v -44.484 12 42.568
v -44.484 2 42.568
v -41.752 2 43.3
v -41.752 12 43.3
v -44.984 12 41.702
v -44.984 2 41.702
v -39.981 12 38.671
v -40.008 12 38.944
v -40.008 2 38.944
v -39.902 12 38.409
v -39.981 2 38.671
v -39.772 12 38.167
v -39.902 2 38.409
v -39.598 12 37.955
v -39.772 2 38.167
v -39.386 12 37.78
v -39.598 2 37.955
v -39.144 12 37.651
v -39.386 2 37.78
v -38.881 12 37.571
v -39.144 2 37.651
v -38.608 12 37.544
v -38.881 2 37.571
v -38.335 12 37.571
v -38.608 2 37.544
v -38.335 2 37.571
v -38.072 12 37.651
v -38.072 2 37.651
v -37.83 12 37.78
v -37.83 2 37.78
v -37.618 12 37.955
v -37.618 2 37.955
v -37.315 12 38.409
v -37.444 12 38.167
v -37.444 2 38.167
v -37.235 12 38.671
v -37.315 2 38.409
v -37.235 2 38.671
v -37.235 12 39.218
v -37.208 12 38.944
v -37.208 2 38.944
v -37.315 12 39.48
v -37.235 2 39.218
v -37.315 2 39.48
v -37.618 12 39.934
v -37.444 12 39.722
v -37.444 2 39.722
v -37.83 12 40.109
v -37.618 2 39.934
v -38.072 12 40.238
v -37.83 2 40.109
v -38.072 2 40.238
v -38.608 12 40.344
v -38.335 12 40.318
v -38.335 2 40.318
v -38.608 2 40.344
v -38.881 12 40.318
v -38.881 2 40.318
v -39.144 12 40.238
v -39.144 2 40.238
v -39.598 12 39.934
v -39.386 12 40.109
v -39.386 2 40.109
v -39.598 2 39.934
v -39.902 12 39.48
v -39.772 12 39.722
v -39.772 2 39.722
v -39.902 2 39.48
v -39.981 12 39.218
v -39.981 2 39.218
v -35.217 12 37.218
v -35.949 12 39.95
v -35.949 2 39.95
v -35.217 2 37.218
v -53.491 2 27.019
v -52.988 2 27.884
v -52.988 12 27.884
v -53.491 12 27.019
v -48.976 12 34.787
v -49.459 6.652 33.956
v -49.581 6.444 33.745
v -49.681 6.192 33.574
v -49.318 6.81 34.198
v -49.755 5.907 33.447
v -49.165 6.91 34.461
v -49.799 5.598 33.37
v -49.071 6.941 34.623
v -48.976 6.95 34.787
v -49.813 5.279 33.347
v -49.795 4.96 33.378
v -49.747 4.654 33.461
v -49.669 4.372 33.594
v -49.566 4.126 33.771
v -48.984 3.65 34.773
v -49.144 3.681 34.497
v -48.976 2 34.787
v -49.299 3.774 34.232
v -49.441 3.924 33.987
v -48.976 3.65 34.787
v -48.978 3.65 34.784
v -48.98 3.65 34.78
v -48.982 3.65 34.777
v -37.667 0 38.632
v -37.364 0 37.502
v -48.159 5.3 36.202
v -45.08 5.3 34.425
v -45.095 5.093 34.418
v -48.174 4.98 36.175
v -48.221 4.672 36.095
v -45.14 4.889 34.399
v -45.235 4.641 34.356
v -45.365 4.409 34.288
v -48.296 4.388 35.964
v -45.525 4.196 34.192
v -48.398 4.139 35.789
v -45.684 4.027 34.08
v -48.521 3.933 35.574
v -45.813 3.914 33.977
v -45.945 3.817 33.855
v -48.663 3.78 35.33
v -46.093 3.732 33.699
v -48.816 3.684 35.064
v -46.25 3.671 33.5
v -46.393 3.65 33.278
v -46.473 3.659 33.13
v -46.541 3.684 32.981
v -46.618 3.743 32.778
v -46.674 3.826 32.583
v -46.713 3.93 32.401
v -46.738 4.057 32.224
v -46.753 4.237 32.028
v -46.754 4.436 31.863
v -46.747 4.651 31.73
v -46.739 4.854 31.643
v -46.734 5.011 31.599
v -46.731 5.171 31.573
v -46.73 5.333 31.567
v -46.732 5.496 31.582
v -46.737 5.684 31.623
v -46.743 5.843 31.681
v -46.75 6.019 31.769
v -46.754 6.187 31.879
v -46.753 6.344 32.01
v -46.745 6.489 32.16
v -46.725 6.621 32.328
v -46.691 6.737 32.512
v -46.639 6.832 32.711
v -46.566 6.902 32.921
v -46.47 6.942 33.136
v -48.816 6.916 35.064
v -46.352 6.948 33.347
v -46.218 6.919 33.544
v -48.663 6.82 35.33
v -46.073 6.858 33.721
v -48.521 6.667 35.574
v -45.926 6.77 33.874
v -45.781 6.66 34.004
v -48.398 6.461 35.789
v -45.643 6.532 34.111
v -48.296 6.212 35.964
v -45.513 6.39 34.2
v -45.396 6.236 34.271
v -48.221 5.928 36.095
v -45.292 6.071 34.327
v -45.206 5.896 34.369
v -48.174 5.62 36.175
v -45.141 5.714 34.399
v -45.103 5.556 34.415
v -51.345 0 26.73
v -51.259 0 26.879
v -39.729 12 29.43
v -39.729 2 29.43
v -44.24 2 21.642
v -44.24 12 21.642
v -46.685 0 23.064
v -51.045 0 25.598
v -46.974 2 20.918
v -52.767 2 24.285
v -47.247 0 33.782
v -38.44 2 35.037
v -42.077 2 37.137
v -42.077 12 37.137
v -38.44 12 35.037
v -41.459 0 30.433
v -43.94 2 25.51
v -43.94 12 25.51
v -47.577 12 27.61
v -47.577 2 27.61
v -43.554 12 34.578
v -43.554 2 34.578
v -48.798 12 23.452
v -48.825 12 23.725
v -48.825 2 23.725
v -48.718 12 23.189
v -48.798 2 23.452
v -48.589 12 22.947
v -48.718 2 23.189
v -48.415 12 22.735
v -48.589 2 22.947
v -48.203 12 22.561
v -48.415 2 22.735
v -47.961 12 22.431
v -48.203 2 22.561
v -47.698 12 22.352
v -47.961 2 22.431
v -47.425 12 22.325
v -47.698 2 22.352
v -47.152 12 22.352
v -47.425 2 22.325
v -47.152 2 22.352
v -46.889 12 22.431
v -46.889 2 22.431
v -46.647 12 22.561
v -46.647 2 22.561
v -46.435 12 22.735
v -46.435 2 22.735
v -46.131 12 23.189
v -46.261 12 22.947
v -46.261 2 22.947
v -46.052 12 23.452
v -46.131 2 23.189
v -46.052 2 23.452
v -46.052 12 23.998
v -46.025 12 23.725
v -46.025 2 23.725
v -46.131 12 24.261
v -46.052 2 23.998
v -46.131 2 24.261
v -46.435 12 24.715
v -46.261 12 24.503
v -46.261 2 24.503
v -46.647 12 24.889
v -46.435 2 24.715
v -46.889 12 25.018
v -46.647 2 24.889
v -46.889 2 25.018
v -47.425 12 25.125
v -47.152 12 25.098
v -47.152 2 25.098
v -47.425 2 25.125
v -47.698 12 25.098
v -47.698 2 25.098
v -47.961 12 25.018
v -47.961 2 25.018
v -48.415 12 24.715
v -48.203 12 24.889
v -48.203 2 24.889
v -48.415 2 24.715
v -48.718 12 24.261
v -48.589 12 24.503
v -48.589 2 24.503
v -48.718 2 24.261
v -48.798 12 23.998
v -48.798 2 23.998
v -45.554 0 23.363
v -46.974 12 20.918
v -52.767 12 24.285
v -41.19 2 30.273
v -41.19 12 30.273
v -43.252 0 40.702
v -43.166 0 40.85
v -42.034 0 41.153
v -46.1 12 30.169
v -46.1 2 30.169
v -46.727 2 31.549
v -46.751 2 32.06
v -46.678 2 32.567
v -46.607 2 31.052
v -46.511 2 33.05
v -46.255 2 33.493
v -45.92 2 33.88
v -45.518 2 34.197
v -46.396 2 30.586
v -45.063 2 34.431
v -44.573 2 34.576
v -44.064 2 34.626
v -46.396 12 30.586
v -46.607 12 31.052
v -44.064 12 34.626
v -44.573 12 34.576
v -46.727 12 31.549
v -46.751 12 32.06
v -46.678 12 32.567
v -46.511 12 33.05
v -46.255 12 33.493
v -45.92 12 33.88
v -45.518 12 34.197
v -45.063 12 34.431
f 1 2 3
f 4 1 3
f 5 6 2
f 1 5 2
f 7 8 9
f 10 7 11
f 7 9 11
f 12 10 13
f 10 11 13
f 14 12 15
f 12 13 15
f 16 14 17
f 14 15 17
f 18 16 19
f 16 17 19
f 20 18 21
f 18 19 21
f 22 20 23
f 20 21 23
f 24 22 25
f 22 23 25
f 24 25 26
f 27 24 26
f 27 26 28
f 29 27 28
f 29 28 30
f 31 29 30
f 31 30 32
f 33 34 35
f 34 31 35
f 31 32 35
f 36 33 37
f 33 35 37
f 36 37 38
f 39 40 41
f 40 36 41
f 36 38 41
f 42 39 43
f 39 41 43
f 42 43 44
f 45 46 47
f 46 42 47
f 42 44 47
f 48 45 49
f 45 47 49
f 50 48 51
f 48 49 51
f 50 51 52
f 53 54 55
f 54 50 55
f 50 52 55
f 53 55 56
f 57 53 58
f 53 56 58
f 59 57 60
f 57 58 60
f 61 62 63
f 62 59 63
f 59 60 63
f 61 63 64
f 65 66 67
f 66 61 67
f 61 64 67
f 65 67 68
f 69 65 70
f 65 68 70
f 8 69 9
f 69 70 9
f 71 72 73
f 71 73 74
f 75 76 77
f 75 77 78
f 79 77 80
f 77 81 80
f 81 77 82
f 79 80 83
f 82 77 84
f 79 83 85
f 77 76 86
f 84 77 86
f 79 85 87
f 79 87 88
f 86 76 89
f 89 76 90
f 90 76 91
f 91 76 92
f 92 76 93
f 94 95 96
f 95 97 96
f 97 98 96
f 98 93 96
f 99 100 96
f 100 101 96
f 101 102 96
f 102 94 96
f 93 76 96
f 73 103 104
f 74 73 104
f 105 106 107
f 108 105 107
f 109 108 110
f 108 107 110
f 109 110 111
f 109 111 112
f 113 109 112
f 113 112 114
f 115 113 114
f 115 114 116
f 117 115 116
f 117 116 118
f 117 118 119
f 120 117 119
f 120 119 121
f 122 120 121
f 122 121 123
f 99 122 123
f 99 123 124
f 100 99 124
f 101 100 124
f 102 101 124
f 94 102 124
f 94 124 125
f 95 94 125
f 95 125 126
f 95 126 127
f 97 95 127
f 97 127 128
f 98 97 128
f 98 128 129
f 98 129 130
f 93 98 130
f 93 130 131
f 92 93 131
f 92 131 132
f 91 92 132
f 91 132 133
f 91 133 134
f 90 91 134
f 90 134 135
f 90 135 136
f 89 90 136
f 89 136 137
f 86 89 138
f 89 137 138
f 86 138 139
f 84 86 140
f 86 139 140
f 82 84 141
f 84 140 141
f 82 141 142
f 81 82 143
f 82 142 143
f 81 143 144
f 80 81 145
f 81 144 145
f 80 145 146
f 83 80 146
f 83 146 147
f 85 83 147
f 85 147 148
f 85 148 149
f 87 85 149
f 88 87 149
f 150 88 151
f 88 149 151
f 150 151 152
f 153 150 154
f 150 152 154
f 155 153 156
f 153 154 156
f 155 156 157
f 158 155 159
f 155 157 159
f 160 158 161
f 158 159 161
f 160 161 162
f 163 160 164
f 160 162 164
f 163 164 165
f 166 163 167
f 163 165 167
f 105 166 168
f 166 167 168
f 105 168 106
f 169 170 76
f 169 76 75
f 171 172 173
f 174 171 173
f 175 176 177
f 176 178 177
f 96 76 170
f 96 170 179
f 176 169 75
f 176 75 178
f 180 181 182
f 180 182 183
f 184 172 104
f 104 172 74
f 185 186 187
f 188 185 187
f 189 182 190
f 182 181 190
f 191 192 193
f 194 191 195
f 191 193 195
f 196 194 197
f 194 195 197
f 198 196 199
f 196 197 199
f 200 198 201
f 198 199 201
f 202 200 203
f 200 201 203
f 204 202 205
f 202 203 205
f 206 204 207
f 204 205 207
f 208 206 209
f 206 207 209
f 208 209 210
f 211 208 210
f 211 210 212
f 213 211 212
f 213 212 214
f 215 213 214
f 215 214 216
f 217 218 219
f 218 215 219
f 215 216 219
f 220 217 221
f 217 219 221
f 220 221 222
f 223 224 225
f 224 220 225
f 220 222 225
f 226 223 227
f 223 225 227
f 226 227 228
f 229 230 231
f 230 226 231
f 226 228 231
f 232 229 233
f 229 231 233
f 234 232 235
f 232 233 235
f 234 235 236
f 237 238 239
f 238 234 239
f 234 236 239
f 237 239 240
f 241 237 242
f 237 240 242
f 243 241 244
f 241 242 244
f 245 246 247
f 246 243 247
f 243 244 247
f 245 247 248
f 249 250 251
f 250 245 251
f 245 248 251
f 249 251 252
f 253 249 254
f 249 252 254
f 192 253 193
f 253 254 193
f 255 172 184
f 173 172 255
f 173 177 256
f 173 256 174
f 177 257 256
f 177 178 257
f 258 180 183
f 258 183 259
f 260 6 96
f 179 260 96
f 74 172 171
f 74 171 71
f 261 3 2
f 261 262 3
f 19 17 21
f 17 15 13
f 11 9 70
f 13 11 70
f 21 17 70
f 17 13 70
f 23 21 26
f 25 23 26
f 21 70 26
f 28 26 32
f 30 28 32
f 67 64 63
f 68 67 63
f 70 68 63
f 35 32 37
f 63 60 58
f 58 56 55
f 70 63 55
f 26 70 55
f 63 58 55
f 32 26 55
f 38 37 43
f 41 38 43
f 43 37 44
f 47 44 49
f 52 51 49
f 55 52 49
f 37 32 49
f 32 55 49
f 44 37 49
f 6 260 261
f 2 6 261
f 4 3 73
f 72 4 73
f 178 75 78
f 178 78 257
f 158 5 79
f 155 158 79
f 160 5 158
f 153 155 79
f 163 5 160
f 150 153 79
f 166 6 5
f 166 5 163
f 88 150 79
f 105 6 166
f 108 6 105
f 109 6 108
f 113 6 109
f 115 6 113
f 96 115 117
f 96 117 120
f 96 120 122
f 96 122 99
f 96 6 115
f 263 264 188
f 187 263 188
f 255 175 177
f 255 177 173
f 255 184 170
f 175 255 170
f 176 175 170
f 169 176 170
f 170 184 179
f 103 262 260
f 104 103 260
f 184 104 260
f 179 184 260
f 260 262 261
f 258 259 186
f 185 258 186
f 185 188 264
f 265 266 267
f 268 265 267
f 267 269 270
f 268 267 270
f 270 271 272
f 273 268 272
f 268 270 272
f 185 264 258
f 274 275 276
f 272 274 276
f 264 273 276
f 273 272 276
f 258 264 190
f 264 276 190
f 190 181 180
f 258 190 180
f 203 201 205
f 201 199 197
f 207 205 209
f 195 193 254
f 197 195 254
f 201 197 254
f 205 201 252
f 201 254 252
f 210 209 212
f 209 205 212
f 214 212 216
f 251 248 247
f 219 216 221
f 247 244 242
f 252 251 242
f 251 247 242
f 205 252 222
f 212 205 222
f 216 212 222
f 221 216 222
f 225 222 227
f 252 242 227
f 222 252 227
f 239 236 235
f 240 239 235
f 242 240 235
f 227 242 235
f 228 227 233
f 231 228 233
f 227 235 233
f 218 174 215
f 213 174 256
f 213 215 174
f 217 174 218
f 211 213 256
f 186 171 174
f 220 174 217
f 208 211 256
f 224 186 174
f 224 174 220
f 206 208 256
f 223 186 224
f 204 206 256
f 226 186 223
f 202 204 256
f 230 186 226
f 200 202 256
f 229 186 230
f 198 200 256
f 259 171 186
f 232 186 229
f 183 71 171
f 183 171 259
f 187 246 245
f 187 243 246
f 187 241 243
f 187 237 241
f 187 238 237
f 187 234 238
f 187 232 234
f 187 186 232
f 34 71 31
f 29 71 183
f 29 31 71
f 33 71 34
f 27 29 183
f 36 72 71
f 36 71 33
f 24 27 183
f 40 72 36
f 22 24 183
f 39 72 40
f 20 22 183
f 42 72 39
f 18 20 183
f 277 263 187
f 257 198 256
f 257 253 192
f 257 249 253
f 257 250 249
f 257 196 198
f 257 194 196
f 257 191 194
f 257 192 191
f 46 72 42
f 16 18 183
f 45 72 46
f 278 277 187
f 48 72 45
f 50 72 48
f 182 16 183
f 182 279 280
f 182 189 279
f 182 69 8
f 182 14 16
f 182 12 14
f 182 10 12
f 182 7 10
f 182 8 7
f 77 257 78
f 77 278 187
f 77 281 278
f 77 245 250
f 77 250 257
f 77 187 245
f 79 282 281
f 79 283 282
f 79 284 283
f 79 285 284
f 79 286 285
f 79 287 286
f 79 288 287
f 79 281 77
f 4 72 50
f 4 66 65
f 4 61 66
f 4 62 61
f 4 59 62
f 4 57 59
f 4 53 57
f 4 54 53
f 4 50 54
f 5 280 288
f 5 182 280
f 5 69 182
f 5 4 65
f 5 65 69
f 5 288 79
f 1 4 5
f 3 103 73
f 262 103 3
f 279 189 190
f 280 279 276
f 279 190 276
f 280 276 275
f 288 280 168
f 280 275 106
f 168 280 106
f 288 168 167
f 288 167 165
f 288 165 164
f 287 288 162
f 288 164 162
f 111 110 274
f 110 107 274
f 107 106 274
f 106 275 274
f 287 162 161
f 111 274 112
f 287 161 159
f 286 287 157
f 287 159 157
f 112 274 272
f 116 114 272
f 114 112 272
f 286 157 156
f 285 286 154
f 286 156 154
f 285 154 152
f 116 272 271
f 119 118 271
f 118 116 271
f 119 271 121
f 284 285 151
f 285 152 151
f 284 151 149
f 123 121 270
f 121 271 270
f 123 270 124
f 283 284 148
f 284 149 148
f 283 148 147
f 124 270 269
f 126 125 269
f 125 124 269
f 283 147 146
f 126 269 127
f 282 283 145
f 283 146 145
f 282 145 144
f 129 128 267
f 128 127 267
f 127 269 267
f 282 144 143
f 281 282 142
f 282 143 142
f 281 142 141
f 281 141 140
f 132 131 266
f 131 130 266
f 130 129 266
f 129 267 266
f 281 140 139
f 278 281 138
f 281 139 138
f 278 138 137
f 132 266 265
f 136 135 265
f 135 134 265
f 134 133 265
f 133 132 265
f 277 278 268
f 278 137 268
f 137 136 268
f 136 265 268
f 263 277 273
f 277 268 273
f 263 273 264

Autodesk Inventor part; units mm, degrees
ref_plane "YZ Plane" through (0, 0, 0) normal (1, 0, 0) x (0, 1, 0)
ref_plane "XZ Plane" through (0, 0, 0) normal (0, 1, 0) x (-1, 0, 0)
ref_plane "XY Plane" through (0, 0, 0) normal (0, 0, 1) x (1, 0, 0)
sketch "Sketch1" plane through (0, 0, 0) normal (0, 1, 0) x (-1, 0, 0)
  line L0 (41.1895, 30.2734) -> (43.9395, 25.5103)
  line L1 (43.9395, 25.5103) -> (47.5768, 27.6103)
  line L2 (42.0768, 37.1366) -> (38.4395, 35.0366)
  line L3 (38.4395, 35.0366) -> (41.1895, 30.2734)
  arc A0 (46.0996, 30.1689) -> (43.5541, 34.578) centre (44.0588, 31.93) ccw
  line L4 (42.0768, 37.1366) -> (43.5541, 34.578)
  line L5 (46.0996, 30.1689) -> (47.5768, 27.6103)
  line L6 (40.2582, 36.0866) -> (43.5582, 36.0866) construction
  circle A1 centre (38.6082, 38.9445) radius 1.4
  line L7 (41.7517, 43.2997) -> (35.9493, 39.9497)
  line L8 (35.9493, 39.9497) -> (35.2173, 37.2177)
  line L9 (39.7286, 29.43) -> (35.2173, 37.2177)
  line L10 (44.4838, 42.5677) -> (41.7517, 43.2997)
  line L11 (44.9838, 41.7016) -> (44.4838, 42.5677)
  line L12 (44.9838, 41.7016) -> (48.976, 34.7869)
  circle A2 centre (47.4248, 23.7248) radius 1.4
  line L13 (52.7668, 24.2851) -> (46.9742, 20.9182)
  line L14 (46.9742, 20.9182) -> (44.24, 21.6423)
  line L15 (39.7286, 29.43) -> (44.24, 21.6423)
  line L16 (53.4908, 27.0193) -> (52.7668, 24.2851)
  line L17 (52.9883, 27.8839) -> (53.4908, 27.0193)
  line L18 (52.9883, 27.8839) -> (48.976, 34.7869)
  point P0 (34.2173, 38.9497)
  point P1 (43.4838, 44.2997)
  point P2 (45.245, 19.9132)
  point P3 (54.4959, 25.2902)
  dimension "d0" = 5
  dimension "d29" = 2.8
  dimension "d32" = 2
  dimension "d33" = 2
  dimension "d34" = 2
  dimension "d35" = 2
  dimension "d41" = 2.8
extrude "Extrusion1" add sketch "Sketch1" along normal blind 12
sketch "Sketch3" plane through (-38.4395, 2, 35.0366) normal (-0.8660254, 0, 0.5) x (0.5, 0, 0.8660254)
  line L0 (-11, 0) -> (0, 0) projected
  line L1 (-5.5, 0) -> (-5.5, 3.3)
  circle A0 centre (-5.5, 3.3) radius 1.65
  point P0 (-11.1228, -2)
  dimension "d20" = 3.3
  dimension "d21" = 3.3
extrude "Extrusion3" cut sketch "Sketch3" along normal through all
sketch "Sketch4" plane through (0, 0, 0) normal (0, -1, 0) x (1, 0, 0)
  line L0 (-42.0768, 37.1366) -> (-38.4395, 35.0366) projected
  line L1 (-38.4395, 35.0366) -> (-43.9395, 25.5103) projected
  line L2 (-43.9395, 25.5103) -> (-47.5768, 27.6103) projected
  line L3 (-47.5768, 27.6103) -> (-46.0996, 30.1689) projected
  arc A0 (-43.5541, 34.578) -> (-46.0996, 30.1689) centre (-44.0588, 31.93) ccw projected
  line L4 (-43.5541, 34.578) -> (-42.0768, 37.1366) projected
  circle A1 centre (-47.4248, 23.7248) radius 1.4 projected
  circle A2 centre (-38.6082, 38.9445) radius 1.4 projected
  line L5 (-44.24, 21.6423) -> (-35.2173, 37.2177) projected
  line L6 (-35.2173, 37.2177) -> (-35.9493, 39.9497) projected
  line L7 (-35.9493, 39.9497) -> (-41.7517, 43.2997) projected
  line L8 (-41.7517, 43.2997) -> (-44.4838, 42.5677) projected
  line L9 (-44.4838, 42.5677) -> (-48.976, 34.7869) projected
  line L10 (-48.976, 34.7869) -> (-53.4908, 27.0193) projected
  line L11 (-53.4908, 27.0193) -> (-52.7668, 24.2851) projected
  line L12 (-52.7668, 24.2851) -> (-46.9742, 20.9182) projected
  line L13 (-46.9742, 20.9182) -> (-44.24, 21.6423) projected
  point P0 (0, 0)
extrude "Extrusion4" add sketch "Sketch4" against normal blind 2 contours L0 L1 L2 L3 A0 L4 | A1 | A2
chamfer "Chamfer2" distance 2 angle 45 9 edges at (-53.1288, 0, 25.6522) (-51.2334, 0, 30.9031) (-46.7299, 0, 38.6773) (-43.1177, 0, 42.9337) (-38.8505, 0, 41.6247) (-35.5833, 0, 38.5837) (-39.7286, 0, 29.43) (-45.6071, 0, 21.2803) (-49.8705, 0, 22.6017)
equation "\"d33\" = d32"
equation "\"d35\" = d34"
properties part number "TSOP Holder Straight" material "ABS Plastic"
